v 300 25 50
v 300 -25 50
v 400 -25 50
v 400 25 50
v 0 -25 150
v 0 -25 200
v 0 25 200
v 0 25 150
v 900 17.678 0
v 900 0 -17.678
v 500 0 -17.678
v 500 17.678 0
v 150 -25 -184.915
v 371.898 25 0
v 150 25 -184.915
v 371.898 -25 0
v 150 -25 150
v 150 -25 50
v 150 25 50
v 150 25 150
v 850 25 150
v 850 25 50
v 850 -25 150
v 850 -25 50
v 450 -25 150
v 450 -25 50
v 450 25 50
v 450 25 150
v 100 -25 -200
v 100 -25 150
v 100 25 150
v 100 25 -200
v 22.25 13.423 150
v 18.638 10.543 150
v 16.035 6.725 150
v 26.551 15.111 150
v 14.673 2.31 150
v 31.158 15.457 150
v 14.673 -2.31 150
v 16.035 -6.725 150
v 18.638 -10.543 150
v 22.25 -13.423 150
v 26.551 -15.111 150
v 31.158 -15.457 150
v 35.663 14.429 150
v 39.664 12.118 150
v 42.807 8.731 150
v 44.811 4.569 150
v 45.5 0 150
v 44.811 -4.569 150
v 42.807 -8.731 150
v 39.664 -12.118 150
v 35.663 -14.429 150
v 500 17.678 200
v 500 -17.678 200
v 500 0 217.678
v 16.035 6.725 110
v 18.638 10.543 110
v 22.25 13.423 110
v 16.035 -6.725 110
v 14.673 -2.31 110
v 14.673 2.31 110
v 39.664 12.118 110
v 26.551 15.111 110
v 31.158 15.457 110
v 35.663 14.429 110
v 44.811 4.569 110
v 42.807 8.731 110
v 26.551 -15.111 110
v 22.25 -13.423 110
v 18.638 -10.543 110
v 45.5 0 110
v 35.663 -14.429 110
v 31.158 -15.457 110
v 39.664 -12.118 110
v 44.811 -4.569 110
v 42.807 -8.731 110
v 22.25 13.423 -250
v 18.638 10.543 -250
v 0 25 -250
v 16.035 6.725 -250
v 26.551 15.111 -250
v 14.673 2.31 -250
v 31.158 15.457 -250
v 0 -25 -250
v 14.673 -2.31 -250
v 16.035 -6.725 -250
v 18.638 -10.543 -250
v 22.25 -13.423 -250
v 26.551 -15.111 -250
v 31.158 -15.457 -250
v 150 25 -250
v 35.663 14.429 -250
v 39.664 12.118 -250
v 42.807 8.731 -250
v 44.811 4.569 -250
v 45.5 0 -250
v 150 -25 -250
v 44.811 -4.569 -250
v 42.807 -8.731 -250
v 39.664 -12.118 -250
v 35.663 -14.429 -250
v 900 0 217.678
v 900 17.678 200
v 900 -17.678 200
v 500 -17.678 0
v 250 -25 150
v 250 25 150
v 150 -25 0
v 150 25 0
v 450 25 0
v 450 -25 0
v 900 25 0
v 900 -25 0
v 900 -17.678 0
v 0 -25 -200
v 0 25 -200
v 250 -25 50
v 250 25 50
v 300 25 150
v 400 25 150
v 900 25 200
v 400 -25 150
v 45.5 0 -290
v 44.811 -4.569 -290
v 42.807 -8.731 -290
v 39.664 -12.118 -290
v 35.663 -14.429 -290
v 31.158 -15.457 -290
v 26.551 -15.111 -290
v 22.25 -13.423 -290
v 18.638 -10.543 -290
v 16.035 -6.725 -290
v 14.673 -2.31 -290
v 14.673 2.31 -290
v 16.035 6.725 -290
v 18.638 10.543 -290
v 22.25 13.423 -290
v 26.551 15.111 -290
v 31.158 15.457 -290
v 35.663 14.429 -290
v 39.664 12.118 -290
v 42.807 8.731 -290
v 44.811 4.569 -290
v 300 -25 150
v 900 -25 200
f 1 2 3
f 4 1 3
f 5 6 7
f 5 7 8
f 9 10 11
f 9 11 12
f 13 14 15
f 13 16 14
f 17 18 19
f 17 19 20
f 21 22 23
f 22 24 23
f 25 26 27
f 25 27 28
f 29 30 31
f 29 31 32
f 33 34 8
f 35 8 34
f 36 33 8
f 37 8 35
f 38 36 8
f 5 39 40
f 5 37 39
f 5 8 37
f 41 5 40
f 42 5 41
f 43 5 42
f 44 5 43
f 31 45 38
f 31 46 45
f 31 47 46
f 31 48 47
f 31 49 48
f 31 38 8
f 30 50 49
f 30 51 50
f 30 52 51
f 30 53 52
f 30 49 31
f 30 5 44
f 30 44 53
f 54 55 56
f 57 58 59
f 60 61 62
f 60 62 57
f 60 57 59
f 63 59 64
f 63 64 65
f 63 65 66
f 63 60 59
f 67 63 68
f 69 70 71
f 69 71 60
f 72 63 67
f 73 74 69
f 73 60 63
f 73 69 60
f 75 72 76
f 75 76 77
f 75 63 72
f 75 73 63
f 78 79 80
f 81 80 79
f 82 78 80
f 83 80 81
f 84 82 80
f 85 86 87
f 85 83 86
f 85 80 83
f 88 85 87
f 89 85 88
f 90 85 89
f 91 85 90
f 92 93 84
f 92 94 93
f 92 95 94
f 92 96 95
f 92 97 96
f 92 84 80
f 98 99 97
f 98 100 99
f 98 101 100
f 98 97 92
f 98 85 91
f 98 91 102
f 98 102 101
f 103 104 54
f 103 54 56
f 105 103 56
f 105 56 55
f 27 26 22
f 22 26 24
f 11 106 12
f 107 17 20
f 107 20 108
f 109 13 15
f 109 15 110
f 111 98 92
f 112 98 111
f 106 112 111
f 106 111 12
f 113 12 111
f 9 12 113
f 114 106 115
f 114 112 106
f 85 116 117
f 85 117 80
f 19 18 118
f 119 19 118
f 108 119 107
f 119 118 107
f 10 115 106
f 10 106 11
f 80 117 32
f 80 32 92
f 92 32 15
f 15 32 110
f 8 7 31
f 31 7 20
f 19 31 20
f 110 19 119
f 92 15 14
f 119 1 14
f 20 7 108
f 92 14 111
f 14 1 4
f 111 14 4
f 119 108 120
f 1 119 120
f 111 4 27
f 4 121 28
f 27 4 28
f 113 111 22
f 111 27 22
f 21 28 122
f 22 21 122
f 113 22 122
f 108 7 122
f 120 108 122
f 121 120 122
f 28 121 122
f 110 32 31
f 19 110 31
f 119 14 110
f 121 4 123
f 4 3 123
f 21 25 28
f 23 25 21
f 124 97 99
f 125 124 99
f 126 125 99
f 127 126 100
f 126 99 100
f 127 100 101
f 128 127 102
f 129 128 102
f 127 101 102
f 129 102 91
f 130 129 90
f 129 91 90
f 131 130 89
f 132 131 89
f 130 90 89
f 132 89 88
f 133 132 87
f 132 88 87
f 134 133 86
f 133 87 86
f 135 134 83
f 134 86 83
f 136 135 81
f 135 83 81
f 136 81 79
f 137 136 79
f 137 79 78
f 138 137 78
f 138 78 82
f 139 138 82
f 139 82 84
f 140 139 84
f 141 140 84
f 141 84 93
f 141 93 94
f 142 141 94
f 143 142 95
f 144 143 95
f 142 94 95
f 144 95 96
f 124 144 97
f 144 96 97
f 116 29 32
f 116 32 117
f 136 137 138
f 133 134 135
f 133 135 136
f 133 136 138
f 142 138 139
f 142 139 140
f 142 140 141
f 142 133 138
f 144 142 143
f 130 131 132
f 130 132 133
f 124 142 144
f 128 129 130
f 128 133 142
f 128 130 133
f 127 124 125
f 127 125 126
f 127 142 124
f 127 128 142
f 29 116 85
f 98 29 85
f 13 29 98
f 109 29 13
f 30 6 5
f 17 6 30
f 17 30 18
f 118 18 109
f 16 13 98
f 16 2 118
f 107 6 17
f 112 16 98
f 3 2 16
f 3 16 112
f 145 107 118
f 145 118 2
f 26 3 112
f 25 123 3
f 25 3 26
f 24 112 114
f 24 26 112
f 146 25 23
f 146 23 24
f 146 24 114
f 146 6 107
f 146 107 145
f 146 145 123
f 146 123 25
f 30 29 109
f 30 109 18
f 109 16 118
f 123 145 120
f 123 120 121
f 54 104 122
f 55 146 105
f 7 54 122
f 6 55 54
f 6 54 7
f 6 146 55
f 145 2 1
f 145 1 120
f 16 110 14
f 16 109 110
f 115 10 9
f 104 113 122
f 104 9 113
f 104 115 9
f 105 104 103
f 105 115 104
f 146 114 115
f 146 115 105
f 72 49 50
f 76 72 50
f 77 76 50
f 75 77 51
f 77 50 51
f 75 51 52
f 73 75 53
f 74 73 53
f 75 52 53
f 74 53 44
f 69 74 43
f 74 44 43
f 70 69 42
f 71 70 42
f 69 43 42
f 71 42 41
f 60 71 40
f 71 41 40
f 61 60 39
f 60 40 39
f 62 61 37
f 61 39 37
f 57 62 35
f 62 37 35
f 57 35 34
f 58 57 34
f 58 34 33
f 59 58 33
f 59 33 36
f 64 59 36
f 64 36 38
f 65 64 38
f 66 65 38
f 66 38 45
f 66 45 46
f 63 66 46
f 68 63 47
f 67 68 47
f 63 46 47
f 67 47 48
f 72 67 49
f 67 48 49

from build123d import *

# Parameters (mm, degrees)
F0_W     = 100
F0_H     = 100
F0_W_2   = 400
F1_DEPTH = 25
F3_DEPTH = 400
F4_R     = 15.5
F6_DEPTH = 40
F5_R     = 15.5
F7_DEPTH = 40


with BuildPart() as f1:
    # F0 (on Front) → F1 (new body, symmetric)
    with BuildSketch(Plane.XZ):
        Polygon((900, 200), (0, 200), (0, 150), (100, 150), (100, -200), (0, -200), (0, -250), (150, -250), (450, 0), (900, 0), align=None)
        Polygon((150, -184.914586), (150, 0), (371.897503, 0), align=None, mode=Mode.SUBTRACT)
        with Locations((200, 100)):
            Rectangle(F0_W, F0_H, mode=Mode.SUBTRACT)
        with Locations((350, 100)):
            Rectangle(F0_W, F0_H, mode=Mode.SUBTRACT)
        with Locations((650, 100)):
            Rectangle(F0_W_2, F0_H, mode=Mode.SUBTRACT)
    extrude(amount=F1_DEPTH, both=True)

    # F2 (on face) → F3 (join)
    with BuildSketch(Plane.YZ.offset(900)):
        Polygon((0, 217.67767), (-17.67767, 200), (17.67767, 200), align=None)
        Polygon((17.67767, 0), (-17.67767, 0), (0, -17.67767), align=None)
    extrude(amount=-F3_DEPTH)

    # F4 (on face) → F6 (join)
    with BuildSketch(Plane(origin=(0, 0, -250), x_dir=(1, 0, 0), z_dir=(0, 0, -1))):
        with Locations((30, 0)):
            Circle(F4_R)
    extrude(amount=F6_DEPTH)

    # F5 (on face) → F7 (join)
    with BuildSketch(Plane(origin=(0, 0, 150), x_dir=(1, 0, 0), z_dir=(0, 0, -1))):
        with Locations((30, 0)):
            Circle(F5_R)
    extrude(amount=F7_DEPTH)


solid = f1.part
